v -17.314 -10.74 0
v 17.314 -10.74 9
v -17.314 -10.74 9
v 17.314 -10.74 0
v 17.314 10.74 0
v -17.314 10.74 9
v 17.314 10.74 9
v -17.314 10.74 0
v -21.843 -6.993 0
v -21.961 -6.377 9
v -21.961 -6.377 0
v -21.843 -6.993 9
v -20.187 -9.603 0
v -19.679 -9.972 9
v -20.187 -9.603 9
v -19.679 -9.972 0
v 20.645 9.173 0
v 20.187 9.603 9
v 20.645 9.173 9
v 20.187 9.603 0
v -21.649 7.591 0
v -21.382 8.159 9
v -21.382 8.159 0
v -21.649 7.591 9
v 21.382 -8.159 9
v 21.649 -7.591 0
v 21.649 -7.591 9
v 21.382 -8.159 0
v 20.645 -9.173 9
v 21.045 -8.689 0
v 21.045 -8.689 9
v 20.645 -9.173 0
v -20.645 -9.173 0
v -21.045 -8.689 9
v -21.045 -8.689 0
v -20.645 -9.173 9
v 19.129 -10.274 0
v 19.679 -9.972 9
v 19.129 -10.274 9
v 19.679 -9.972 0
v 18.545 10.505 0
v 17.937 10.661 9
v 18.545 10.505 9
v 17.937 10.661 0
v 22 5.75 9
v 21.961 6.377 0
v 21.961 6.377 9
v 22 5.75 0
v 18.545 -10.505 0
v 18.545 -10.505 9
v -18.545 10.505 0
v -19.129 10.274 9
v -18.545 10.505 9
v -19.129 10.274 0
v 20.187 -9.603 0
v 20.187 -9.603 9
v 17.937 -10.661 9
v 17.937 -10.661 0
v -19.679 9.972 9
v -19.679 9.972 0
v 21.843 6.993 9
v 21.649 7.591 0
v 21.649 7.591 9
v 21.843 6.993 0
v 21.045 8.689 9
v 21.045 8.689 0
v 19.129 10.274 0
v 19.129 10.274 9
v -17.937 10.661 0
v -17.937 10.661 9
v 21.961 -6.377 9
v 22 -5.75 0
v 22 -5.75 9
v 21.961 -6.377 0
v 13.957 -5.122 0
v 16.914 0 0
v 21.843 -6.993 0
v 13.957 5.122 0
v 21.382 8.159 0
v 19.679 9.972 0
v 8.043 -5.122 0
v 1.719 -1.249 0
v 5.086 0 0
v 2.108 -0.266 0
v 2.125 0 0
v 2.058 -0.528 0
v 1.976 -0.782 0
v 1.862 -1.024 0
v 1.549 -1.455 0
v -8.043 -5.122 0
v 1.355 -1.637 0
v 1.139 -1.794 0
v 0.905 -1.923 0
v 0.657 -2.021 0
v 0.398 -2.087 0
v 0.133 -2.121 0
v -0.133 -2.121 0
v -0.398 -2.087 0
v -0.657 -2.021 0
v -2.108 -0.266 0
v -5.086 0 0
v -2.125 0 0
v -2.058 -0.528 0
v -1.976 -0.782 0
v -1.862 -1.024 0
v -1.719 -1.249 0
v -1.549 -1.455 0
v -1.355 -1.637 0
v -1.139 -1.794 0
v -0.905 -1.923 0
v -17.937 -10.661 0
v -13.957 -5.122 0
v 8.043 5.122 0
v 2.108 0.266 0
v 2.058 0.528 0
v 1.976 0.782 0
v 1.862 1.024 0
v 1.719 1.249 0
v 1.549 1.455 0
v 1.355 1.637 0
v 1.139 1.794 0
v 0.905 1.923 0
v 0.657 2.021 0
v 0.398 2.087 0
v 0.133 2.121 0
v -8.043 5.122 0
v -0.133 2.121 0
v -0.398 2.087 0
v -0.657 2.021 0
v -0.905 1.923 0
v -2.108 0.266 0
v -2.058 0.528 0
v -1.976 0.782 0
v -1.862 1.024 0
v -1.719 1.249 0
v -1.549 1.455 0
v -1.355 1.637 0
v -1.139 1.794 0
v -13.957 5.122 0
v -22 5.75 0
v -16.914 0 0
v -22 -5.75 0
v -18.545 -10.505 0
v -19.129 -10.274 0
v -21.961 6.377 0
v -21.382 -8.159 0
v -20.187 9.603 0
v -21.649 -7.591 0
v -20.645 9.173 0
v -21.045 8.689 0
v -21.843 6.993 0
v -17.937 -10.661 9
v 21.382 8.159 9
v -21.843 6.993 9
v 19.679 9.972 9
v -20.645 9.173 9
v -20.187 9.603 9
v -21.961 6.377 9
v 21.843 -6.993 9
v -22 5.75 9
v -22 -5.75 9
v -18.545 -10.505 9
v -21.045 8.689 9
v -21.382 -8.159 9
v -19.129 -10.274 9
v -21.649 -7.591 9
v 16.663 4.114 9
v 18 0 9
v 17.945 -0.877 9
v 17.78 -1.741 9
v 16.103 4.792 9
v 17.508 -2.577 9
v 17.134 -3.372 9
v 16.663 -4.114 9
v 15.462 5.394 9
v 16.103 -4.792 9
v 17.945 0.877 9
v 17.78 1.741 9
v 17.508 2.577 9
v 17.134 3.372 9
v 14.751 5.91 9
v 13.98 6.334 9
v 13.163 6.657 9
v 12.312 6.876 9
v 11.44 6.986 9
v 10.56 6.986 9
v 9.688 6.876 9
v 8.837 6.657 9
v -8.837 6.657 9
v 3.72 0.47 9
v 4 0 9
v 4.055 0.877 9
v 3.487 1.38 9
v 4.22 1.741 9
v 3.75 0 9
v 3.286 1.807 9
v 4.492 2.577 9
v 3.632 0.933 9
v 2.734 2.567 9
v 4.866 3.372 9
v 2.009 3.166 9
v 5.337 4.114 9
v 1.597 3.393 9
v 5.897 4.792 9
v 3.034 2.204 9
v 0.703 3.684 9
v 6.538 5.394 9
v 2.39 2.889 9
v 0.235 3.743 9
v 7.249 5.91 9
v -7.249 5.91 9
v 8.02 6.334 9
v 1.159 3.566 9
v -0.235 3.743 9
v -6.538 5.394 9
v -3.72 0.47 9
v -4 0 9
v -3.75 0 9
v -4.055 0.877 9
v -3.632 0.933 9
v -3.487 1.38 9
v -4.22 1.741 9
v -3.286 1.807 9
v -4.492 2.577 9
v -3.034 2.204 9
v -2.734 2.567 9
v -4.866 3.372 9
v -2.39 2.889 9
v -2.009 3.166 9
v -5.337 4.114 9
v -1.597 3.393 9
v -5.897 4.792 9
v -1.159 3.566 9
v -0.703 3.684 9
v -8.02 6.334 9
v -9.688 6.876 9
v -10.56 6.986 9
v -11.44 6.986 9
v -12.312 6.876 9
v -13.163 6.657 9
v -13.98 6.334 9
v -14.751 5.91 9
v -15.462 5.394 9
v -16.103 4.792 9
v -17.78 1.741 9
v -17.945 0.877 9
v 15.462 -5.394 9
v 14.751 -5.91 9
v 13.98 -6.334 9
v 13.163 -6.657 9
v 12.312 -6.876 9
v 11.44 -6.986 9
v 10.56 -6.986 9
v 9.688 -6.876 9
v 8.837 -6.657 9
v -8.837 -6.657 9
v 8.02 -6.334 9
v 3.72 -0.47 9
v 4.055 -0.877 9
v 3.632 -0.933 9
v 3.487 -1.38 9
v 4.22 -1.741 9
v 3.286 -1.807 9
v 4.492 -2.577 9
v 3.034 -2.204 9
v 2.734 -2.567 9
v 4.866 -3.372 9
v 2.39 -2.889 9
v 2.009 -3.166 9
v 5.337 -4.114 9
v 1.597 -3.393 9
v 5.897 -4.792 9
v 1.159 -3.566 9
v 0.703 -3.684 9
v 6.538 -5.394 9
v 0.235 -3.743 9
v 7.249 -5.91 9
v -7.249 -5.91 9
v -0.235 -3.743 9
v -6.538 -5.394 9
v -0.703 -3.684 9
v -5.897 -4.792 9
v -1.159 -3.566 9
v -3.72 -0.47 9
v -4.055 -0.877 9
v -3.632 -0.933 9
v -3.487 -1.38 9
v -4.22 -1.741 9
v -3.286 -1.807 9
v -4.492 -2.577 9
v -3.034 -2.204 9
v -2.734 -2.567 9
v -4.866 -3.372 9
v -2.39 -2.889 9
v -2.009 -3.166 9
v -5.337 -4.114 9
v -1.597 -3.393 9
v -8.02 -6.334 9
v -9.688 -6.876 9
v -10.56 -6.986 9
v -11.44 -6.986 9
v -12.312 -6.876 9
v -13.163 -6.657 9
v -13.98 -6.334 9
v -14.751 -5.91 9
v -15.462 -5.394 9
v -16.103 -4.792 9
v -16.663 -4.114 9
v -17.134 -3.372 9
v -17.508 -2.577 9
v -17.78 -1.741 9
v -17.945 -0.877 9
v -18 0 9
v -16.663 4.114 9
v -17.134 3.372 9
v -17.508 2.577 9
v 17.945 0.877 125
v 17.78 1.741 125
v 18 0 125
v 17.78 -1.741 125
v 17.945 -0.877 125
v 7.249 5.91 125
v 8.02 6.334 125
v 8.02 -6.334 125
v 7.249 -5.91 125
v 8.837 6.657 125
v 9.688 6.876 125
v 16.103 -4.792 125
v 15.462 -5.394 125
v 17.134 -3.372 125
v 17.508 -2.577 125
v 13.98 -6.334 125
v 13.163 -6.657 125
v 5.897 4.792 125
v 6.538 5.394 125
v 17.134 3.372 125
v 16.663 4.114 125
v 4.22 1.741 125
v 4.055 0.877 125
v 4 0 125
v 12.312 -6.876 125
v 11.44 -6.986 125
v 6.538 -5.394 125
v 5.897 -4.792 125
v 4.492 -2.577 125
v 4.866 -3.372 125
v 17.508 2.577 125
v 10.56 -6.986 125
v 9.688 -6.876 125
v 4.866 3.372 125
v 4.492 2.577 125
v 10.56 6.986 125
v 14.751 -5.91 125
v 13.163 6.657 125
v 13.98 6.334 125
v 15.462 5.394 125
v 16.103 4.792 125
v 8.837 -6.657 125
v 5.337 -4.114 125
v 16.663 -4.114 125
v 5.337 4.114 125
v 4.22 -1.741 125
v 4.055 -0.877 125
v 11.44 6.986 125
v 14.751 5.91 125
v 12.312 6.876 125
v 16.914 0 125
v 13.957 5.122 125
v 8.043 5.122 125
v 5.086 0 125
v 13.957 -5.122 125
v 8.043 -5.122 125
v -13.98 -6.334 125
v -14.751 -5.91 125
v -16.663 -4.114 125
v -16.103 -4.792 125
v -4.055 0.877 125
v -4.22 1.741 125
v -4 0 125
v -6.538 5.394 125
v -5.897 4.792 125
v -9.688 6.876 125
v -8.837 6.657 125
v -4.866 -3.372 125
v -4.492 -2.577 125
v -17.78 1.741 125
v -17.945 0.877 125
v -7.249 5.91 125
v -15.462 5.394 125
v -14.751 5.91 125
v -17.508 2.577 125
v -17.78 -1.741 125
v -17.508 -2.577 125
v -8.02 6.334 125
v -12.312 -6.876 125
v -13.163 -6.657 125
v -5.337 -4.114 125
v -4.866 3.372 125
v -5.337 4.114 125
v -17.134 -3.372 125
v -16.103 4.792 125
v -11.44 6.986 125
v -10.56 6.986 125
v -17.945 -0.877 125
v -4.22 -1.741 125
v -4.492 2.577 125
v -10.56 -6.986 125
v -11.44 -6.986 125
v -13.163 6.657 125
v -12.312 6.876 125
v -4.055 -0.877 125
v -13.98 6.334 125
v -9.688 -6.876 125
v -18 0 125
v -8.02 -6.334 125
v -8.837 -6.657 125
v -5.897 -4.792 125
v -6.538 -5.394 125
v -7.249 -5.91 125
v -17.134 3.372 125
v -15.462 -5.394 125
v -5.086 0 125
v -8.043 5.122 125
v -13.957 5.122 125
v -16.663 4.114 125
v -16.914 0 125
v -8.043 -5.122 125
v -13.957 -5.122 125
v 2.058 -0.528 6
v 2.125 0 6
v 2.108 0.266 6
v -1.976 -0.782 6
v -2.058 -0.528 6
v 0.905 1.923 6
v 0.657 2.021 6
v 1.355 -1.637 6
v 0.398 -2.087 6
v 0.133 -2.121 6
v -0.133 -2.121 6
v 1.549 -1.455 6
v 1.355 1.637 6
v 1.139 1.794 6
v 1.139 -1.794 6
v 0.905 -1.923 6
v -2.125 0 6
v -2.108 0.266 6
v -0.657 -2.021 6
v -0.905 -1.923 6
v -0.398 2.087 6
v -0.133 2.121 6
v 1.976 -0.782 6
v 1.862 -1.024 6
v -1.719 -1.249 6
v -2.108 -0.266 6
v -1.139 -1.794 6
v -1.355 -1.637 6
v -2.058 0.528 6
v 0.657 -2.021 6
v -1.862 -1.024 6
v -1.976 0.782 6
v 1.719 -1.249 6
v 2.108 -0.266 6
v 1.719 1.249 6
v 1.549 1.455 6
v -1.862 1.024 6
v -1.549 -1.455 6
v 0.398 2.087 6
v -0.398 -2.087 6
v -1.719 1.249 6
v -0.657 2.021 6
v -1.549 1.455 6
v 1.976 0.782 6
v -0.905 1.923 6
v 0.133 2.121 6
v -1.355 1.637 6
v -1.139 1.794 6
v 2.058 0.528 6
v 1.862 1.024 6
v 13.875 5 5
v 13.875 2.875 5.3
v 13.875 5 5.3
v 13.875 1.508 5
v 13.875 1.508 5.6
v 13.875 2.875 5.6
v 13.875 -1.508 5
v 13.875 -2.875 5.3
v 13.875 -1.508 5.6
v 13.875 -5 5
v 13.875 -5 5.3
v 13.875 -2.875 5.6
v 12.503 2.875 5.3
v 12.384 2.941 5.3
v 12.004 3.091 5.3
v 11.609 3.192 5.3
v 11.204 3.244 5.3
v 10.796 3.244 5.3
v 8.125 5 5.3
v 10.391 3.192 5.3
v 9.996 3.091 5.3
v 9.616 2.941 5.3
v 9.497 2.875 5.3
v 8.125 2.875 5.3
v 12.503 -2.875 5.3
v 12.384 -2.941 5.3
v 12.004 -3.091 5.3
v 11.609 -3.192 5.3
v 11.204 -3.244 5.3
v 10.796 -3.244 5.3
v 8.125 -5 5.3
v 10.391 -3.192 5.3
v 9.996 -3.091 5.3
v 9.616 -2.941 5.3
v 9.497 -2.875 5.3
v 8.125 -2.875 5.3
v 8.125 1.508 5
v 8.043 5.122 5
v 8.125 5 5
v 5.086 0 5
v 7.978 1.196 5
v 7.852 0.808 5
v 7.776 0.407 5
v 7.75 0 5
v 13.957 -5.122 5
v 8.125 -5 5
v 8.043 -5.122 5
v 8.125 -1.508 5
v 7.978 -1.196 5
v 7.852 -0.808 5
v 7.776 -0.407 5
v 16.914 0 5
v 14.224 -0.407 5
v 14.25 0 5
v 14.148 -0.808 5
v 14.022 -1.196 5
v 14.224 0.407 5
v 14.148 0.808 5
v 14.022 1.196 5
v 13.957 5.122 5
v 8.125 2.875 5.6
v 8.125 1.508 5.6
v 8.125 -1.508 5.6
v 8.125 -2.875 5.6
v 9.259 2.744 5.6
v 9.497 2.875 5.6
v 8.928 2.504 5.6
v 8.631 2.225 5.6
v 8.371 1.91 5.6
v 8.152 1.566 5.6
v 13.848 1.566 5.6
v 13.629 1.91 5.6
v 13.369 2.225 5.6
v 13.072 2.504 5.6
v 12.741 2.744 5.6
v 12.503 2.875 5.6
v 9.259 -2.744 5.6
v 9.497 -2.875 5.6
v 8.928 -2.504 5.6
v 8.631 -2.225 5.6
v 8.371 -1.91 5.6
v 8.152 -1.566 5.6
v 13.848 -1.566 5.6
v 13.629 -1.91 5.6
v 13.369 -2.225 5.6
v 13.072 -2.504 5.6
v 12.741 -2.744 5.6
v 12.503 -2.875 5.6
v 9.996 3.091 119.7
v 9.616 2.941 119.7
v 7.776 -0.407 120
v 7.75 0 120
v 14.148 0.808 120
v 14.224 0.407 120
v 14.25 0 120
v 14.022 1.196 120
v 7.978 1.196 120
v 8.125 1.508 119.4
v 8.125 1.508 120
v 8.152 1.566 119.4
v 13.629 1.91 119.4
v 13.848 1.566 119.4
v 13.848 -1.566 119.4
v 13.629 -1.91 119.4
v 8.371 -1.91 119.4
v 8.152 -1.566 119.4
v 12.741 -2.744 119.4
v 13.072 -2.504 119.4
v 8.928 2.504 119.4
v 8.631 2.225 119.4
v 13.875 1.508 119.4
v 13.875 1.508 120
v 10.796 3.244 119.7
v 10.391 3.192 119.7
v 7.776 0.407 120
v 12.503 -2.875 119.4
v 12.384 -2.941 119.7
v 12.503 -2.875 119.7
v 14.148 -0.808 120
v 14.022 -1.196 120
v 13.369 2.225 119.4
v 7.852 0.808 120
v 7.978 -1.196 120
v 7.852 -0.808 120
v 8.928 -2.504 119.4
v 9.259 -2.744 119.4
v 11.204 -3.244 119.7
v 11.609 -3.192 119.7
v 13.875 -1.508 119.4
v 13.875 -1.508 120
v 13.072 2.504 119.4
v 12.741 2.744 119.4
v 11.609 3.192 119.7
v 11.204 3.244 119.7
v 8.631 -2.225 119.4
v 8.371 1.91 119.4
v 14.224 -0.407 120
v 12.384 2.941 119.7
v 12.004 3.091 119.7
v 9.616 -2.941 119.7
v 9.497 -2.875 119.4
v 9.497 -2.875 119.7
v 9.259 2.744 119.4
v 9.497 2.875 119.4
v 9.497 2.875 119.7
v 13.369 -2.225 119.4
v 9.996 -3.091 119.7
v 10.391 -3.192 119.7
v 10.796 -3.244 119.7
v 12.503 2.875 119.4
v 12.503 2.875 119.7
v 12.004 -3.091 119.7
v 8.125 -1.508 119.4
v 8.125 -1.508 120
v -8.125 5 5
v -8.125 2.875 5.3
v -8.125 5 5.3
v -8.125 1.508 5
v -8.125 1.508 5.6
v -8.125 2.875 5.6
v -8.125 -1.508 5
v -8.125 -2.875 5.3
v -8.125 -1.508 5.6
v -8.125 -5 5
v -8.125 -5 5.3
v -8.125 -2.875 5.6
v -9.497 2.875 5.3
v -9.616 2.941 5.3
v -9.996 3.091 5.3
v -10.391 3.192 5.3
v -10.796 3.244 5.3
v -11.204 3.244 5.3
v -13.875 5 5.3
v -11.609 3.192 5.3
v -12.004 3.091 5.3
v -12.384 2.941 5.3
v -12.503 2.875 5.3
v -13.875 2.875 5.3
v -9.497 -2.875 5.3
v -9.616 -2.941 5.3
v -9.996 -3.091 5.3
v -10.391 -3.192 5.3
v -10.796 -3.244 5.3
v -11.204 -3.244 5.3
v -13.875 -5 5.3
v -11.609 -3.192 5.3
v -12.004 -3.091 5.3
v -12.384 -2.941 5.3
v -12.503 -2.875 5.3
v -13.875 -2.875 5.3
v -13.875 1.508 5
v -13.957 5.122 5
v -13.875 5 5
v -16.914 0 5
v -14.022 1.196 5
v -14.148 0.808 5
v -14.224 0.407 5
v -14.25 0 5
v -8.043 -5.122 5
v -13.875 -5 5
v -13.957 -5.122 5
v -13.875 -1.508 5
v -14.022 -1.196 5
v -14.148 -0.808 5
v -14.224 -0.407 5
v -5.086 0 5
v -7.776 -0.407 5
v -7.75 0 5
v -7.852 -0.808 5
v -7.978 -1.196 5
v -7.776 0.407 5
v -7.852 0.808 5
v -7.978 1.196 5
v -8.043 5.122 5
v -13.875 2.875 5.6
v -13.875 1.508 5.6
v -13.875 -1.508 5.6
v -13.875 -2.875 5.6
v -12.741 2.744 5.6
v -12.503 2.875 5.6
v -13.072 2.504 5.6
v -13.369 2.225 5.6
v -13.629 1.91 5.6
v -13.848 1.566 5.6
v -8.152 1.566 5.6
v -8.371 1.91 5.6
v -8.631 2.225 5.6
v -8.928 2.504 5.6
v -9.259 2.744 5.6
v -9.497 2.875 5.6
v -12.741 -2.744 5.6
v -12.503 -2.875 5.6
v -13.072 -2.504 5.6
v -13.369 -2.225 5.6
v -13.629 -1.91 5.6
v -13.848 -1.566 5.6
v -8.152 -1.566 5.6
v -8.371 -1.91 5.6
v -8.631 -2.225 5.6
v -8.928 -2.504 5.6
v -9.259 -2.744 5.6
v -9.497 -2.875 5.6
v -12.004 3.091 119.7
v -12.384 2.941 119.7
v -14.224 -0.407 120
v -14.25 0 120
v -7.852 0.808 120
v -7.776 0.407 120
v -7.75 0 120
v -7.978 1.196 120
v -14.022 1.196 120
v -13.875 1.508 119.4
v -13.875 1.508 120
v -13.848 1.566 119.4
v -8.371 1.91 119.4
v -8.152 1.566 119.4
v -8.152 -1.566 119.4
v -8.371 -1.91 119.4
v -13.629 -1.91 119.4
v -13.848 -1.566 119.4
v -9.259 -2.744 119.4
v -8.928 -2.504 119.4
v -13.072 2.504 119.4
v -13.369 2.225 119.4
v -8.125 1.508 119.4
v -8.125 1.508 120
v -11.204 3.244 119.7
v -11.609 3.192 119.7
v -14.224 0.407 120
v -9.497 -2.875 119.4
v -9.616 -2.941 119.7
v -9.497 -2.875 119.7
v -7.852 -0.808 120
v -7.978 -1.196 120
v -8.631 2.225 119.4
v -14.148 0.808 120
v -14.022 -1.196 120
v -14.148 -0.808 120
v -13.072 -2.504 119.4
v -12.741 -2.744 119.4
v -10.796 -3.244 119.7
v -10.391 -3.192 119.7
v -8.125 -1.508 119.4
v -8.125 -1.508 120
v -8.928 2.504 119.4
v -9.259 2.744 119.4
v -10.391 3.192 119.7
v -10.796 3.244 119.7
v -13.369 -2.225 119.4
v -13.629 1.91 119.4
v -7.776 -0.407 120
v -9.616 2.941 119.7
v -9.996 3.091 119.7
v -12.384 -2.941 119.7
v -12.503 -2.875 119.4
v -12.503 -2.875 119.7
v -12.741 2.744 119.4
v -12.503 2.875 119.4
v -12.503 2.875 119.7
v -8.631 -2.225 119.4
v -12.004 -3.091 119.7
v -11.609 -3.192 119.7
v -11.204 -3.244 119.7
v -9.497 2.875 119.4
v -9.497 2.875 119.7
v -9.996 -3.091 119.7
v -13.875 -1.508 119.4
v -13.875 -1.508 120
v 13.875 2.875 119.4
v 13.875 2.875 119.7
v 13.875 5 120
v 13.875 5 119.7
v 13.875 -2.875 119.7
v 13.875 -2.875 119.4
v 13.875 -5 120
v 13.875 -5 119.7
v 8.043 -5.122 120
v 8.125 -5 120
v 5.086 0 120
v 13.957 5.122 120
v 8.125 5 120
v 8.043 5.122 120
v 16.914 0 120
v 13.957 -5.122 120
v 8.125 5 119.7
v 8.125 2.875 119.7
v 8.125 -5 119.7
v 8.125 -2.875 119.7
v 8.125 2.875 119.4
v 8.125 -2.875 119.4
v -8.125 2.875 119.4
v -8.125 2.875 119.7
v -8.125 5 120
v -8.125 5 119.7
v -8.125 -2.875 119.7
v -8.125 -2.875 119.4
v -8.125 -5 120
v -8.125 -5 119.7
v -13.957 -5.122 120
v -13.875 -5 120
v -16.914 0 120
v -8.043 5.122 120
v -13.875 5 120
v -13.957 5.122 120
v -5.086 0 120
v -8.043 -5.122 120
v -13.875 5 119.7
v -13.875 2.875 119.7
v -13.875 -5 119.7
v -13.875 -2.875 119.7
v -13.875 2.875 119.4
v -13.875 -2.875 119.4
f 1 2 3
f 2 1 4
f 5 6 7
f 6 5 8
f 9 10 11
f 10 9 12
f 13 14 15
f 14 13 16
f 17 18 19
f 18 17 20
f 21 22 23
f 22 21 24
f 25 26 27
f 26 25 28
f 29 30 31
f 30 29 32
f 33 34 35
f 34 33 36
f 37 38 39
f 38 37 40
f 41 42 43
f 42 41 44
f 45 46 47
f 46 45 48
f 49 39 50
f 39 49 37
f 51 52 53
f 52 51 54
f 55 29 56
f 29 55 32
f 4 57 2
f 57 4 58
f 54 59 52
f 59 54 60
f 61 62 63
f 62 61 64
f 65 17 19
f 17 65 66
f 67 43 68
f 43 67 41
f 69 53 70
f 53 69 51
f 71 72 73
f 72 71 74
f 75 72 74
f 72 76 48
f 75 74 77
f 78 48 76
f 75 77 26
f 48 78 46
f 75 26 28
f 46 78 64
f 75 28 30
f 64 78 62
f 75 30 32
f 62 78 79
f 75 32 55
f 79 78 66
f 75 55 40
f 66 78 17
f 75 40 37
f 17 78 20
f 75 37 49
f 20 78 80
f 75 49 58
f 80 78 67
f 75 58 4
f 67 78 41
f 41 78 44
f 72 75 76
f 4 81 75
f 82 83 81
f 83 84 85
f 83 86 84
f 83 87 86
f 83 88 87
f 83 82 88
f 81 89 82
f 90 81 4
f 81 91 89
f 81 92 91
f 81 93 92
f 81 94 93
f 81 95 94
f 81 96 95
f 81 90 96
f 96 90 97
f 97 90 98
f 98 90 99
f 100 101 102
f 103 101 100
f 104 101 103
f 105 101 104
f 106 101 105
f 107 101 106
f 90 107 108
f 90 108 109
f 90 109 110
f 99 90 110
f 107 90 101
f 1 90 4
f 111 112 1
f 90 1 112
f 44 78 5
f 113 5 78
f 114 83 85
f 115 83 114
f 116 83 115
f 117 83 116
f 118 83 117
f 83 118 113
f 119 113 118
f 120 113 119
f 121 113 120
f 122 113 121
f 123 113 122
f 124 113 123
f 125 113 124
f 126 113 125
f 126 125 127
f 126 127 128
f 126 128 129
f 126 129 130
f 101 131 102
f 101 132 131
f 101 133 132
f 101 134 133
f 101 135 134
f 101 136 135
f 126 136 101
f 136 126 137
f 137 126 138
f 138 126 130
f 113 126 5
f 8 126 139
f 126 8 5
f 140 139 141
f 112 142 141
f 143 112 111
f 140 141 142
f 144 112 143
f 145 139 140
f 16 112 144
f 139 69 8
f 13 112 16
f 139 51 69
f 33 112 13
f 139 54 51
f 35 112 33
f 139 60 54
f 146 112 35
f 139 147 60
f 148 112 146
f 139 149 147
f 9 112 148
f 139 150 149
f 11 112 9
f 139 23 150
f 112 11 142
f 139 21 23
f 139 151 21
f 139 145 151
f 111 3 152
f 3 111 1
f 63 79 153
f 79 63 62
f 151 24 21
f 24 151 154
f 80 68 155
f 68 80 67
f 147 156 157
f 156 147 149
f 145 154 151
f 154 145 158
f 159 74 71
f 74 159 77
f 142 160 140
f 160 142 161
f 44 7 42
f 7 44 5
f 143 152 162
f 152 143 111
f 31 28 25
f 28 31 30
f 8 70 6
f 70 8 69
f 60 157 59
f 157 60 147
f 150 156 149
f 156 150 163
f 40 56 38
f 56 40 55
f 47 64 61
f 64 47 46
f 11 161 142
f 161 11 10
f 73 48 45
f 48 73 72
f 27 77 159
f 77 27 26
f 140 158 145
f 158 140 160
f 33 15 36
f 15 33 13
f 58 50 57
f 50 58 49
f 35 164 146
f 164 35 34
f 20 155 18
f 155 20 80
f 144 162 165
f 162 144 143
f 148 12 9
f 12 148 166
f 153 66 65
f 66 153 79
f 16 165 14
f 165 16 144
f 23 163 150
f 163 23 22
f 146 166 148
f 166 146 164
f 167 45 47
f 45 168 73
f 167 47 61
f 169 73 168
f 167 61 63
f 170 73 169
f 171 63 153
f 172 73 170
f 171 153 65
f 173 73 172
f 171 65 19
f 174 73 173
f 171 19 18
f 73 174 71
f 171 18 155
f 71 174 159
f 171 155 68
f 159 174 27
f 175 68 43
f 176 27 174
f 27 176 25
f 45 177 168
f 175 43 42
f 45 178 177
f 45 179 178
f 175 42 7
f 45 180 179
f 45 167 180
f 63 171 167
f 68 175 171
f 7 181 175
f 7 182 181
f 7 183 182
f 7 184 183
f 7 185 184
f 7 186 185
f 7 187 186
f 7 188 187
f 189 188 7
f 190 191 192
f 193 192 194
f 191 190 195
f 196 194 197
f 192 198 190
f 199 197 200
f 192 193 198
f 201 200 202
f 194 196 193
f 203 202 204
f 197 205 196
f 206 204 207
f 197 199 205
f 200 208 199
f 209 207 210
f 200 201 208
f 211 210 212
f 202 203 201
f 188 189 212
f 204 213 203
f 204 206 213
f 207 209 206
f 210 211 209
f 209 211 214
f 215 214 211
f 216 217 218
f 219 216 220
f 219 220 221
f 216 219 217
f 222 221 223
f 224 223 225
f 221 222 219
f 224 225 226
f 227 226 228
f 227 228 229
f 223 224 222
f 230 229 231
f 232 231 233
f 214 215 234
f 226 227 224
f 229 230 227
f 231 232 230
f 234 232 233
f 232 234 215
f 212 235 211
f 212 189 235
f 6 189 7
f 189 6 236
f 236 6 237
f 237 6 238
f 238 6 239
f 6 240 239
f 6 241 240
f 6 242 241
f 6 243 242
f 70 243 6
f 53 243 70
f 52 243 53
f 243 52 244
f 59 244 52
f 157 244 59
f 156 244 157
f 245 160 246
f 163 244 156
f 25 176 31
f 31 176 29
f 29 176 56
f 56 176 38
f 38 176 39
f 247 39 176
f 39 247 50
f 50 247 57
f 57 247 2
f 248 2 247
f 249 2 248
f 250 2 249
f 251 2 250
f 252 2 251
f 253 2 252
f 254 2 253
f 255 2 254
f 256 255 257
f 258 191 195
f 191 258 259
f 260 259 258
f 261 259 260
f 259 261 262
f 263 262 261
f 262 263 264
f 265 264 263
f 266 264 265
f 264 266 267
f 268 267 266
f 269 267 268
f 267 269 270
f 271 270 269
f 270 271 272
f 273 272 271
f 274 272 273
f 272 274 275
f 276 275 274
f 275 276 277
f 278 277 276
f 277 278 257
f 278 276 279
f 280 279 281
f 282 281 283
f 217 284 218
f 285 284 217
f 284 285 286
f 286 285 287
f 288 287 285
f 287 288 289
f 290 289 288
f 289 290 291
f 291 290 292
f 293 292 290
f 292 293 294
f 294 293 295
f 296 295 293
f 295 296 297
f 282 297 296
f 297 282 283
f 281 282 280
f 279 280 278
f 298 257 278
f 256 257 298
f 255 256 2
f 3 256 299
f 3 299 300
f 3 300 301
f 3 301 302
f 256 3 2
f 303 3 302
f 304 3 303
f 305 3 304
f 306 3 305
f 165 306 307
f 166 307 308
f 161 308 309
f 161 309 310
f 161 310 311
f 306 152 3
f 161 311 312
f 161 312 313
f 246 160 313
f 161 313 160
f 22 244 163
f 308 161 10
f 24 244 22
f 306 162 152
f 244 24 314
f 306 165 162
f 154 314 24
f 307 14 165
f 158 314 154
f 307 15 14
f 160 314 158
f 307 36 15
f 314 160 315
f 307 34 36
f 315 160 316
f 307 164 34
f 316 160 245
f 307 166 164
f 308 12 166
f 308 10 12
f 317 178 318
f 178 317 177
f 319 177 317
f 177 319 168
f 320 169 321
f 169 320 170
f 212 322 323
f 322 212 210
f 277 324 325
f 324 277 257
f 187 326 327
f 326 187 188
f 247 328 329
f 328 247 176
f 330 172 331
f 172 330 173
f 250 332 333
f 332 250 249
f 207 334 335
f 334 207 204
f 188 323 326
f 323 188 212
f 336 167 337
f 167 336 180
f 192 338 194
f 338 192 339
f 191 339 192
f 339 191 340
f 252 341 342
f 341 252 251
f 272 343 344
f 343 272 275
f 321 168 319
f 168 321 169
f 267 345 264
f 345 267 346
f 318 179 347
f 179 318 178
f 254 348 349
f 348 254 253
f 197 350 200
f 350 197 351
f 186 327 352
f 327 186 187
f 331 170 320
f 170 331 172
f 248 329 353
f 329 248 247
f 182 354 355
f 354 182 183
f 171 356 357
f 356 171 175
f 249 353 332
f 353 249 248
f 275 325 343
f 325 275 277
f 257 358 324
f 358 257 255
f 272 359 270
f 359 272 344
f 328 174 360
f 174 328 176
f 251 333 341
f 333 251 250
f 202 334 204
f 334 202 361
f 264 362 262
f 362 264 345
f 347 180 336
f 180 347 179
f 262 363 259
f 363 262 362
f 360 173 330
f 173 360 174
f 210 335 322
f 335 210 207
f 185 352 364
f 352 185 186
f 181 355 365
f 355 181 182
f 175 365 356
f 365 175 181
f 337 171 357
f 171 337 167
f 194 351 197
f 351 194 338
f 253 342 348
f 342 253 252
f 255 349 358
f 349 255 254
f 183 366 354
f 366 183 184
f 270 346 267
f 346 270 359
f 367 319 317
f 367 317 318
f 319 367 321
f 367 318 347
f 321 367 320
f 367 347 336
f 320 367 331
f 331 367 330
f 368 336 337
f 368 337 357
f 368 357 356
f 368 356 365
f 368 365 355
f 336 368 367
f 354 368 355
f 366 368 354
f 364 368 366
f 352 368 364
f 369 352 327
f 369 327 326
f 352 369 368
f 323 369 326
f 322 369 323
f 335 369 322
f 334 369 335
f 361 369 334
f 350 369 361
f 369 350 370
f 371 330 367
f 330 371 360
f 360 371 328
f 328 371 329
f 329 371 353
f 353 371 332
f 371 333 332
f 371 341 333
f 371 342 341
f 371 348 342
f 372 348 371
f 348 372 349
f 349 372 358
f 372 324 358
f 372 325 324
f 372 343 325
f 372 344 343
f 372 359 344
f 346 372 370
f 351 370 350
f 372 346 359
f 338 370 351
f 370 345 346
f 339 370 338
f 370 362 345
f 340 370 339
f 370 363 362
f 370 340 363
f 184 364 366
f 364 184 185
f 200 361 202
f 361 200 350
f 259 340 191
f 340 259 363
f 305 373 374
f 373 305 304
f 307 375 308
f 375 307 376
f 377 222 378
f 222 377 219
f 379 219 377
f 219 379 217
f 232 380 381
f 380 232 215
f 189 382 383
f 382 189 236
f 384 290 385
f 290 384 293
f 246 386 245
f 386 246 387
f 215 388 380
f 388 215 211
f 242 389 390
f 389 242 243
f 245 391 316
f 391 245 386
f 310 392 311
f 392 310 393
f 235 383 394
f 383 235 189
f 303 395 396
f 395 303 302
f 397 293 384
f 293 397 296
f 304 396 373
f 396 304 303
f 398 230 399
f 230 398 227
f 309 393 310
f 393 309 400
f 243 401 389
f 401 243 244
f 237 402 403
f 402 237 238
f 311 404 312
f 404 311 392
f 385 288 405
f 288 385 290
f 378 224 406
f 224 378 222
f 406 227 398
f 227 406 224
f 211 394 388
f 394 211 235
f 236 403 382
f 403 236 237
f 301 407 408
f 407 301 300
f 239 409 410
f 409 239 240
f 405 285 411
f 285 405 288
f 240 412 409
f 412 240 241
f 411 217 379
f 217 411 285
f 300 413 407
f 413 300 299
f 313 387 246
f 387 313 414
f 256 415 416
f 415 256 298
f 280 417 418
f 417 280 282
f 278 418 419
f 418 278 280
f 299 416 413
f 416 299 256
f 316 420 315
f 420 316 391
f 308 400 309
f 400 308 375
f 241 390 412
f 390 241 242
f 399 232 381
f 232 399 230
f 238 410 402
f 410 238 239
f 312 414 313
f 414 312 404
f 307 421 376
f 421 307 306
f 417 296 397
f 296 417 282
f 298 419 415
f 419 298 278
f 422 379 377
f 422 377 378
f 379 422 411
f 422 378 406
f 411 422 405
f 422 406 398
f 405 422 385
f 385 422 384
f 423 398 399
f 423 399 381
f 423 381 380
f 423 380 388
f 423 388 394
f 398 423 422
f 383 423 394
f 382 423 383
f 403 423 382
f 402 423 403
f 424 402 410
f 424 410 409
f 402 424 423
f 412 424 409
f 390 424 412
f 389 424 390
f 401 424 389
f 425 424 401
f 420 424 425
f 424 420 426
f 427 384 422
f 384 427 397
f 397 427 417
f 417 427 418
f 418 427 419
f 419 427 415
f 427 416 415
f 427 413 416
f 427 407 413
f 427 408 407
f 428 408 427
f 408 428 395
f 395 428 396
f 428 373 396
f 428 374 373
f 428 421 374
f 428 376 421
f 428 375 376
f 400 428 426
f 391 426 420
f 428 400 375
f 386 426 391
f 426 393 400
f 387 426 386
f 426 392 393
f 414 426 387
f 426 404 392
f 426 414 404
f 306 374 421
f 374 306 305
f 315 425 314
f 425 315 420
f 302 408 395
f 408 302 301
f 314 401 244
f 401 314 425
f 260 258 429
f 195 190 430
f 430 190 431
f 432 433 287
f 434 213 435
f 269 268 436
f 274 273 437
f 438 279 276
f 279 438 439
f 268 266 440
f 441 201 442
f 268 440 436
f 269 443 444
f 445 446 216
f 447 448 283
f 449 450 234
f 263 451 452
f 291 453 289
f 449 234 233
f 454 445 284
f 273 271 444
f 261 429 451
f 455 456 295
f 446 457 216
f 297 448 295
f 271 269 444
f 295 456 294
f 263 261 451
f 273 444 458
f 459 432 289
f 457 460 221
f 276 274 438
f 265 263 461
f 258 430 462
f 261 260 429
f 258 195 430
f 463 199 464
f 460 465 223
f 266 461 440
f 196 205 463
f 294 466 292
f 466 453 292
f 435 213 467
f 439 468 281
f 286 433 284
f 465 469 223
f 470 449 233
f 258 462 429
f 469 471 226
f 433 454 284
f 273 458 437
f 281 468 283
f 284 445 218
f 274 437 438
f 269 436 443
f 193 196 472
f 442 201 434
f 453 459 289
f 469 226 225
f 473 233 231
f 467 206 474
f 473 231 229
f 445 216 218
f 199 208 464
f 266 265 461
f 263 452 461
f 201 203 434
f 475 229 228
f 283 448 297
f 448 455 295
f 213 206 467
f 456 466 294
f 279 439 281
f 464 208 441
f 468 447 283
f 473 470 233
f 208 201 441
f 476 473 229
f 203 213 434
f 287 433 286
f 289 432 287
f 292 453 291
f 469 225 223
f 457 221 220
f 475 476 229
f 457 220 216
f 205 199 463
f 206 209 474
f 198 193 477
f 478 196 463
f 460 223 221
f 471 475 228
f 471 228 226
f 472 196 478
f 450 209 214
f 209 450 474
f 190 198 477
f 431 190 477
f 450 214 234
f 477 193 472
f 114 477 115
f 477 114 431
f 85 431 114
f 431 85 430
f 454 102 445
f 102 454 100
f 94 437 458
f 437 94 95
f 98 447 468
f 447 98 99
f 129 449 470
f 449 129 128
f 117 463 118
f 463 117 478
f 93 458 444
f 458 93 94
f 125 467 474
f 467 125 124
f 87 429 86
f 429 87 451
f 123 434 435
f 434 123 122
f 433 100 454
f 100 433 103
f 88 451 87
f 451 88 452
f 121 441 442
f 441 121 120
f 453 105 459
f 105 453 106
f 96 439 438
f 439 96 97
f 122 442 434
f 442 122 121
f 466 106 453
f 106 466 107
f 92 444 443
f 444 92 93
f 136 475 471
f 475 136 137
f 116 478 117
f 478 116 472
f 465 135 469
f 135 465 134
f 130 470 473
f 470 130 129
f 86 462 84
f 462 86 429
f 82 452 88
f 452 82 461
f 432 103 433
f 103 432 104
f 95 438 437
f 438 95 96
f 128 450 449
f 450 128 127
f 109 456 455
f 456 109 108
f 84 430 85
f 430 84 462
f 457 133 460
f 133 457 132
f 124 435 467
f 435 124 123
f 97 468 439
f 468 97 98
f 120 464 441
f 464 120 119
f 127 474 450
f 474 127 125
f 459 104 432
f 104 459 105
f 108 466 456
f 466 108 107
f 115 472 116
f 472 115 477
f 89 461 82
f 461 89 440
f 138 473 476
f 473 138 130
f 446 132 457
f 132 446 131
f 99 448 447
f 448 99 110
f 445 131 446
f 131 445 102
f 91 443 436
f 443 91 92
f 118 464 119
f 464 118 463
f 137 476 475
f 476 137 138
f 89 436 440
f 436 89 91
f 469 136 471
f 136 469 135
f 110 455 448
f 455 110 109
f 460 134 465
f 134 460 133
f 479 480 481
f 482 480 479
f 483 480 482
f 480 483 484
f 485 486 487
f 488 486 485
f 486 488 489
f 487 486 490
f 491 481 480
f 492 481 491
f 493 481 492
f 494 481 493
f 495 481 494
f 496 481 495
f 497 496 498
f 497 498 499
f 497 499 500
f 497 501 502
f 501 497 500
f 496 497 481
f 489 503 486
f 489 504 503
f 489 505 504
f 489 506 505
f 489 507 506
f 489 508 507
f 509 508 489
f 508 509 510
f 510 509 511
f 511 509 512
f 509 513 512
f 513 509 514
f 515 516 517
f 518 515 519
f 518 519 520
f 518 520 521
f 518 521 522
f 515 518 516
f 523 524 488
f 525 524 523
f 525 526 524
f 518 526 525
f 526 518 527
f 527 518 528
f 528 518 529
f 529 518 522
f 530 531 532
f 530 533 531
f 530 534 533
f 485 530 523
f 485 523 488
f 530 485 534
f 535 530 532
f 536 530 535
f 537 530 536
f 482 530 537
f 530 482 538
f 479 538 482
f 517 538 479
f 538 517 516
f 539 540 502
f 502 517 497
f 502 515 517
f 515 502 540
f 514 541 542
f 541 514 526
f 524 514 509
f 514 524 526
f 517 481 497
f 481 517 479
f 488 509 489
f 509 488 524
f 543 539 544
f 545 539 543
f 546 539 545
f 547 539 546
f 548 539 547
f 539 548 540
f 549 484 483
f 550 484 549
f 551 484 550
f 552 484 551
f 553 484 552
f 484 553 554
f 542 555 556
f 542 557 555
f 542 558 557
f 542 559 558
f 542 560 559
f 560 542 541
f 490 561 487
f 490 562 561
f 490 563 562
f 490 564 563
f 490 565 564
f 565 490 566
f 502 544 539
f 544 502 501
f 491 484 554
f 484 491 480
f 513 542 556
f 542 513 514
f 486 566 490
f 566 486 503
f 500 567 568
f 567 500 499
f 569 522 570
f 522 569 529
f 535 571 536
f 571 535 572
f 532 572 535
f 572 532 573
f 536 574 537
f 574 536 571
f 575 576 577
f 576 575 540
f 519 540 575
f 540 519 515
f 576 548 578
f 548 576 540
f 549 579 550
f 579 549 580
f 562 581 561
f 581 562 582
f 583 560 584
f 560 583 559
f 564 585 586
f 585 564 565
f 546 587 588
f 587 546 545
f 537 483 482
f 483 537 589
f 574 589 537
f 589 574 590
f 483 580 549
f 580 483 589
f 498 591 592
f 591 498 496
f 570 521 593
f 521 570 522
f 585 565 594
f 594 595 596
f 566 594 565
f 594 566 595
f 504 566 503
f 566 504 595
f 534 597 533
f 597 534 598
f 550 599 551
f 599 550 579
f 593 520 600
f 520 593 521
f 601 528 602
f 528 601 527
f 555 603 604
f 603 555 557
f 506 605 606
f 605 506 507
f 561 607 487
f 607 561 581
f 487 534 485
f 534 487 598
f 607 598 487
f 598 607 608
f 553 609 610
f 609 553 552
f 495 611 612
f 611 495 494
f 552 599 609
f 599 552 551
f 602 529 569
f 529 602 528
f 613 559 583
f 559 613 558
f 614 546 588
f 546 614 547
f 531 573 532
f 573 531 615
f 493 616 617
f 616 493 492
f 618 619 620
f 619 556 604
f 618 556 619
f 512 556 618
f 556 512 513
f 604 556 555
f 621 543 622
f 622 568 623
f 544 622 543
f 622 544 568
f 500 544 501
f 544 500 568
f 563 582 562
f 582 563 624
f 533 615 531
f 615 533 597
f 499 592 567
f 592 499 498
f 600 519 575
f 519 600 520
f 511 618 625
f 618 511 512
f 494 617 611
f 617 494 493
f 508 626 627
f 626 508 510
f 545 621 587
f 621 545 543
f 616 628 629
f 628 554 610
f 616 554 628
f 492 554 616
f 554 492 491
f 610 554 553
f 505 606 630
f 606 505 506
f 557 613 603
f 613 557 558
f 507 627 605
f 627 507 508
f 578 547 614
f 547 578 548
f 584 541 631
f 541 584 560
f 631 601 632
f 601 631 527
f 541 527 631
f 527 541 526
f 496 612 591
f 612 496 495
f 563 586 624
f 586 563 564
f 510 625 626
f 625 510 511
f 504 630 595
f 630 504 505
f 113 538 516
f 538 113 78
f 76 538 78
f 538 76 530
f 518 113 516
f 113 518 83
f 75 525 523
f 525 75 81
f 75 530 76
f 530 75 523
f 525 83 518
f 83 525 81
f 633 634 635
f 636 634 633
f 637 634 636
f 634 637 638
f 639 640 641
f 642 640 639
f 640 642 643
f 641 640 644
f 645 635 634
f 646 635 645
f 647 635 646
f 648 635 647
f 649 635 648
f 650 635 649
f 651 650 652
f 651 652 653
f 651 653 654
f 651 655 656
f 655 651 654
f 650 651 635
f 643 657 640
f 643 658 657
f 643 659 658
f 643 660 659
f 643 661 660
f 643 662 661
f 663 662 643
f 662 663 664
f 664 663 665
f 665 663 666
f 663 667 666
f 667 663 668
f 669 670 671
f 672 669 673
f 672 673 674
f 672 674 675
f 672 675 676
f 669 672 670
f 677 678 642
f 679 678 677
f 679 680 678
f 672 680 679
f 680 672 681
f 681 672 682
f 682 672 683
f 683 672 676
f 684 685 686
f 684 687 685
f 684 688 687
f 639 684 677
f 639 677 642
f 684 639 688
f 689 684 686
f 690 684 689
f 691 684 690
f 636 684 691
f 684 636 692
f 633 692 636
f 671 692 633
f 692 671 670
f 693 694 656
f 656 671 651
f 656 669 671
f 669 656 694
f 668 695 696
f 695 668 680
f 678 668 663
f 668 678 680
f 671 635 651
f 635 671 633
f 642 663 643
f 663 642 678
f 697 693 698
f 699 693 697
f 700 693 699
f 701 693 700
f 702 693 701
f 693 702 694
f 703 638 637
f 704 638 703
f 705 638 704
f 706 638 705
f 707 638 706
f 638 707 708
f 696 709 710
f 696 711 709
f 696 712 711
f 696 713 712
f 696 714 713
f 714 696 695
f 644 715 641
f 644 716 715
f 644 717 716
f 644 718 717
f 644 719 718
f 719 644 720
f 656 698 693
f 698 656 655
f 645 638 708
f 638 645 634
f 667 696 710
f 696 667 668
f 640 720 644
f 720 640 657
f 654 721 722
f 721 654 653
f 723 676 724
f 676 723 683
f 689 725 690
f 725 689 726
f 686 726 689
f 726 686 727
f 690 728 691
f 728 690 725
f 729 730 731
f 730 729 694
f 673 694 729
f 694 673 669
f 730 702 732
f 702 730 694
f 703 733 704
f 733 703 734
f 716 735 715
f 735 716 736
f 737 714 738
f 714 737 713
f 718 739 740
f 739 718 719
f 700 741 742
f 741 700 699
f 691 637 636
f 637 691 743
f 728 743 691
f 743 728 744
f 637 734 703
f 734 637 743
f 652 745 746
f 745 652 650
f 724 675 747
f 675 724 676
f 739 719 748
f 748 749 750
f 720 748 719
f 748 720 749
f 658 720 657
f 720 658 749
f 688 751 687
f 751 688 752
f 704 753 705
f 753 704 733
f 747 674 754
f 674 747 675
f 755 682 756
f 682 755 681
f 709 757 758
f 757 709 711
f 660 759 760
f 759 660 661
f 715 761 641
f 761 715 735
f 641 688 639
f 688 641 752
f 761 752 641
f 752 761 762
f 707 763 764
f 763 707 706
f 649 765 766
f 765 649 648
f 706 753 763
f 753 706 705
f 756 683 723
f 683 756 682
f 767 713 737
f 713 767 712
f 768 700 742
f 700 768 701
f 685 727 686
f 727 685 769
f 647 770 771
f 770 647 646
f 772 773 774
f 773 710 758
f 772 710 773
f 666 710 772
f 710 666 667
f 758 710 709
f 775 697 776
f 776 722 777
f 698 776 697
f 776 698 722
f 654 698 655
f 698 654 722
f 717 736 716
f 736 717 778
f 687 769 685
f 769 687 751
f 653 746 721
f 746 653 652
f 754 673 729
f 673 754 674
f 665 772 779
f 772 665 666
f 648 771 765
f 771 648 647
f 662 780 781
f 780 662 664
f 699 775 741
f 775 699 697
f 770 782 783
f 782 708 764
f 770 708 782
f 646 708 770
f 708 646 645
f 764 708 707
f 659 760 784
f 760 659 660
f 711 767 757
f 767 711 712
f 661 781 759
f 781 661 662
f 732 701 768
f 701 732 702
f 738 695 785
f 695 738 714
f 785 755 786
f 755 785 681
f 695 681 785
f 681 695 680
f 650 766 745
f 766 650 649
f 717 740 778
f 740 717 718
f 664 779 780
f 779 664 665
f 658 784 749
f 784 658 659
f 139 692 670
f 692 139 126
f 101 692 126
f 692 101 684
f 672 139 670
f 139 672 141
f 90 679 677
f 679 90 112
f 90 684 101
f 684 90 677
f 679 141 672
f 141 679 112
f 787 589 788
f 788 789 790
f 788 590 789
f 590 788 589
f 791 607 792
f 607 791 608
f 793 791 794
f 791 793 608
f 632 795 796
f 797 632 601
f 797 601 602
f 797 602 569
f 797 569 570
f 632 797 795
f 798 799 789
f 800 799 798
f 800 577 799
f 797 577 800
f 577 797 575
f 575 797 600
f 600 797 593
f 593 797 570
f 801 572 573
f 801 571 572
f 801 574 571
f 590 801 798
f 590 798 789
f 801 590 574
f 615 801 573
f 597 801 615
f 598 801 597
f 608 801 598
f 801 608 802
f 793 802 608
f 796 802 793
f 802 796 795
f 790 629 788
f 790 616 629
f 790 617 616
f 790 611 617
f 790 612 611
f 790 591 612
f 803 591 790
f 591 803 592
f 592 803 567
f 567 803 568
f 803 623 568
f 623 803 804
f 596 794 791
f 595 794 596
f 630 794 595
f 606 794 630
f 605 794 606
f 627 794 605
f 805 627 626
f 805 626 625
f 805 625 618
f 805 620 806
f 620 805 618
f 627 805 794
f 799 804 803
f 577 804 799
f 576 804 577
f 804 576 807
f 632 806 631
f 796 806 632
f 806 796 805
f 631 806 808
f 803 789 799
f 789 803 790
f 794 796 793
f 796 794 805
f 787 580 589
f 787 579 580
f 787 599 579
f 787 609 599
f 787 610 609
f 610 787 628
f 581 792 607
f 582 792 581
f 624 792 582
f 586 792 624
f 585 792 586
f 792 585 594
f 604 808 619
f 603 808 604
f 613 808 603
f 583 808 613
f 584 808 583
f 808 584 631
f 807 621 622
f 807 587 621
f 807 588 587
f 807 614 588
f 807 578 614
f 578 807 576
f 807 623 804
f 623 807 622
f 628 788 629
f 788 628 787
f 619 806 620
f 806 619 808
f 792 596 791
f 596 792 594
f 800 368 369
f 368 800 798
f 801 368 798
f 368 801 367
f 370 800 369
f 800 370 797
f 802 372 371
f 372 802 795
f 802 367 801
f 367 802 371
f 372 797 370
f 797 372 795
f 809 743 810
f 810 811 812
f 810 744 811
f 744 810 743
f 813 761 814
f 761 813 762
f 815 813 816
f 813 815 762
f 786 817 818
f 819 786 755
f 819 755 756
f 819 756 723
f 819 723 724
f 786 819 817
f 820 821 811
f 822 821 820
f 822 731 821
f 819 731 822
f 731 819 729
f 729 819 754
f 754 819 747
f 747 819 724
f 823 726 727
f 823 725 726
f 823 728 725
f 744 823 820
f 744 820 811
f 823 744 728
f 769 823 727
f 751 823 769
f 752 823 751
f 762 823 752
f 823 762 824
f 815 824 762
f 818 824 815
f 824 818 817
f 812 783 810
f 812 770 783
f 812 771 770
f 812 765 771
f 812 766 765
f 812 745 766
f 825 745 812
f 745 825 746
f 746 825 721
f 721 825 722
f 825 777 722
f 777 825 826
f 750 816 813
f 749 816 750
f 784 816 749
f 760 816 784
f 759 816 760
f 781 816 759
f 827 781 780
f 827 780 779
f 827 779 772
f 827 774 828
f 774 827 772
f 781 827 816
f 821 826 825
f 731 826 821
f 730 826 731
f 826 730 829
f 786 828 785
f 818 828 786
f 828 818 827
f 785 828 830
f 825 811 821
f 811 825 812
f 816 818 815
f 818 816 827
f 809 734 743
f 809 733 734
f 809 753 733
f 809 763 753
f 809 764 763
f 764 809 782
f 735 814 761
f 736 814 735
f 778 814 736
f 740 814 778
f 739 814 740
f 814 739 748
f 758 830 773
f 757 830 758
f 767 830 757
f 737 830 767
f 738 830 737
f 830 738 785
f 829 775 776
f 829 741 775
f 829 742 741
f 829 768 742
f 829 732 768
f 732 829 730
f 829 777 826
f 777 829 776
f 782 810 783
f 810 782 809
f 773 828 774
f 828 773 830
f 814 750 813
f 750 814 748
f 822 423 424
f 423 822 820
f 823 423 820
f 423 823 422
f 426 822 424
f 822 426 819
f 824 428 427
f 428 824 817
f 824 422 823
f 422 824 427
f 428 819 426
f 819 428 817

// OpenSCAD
$fn = 50;


difference() {
	union() {
		hull() {
			translate(v = [-17.0000000000, 5.7500000000, 0]) {
				cylinder(h = 9, r = 5);
			}
			translate(v = [17.0000000000, 5.7500000000, 0]) {
				cylinder(h = 9, r = 5);
			}
			translate(v = [-17.0000000000, -5.7500000000, 0]) {
				cylinder(h = 9, r = 5);
			}
			translate(v = [17.0000000000, -5.7500000000, 0]) {
				cylinder(h = 9, r = 5);
			}
		}
		translate(v = [11.0000000000, 0, 0.0000000000]) {
			cylinder(h = 125, r = 7.0000000000);
		}
		translate(v = [-11.0000000000, 0, 0.0000000000]) {
			cylinder(h = 125, r = 7.0000000000);
		}
	}
	union() {
		translate(v = [0, 0, 9]) {
			rotate(a = [0, 0, 0]) {
				difference() {
					union() {
						#translate(v = [0, 0, -120.0000000000]) {
							cylinder(h = 120, r = 2.0000000000);
						}
						#translate(v = [0, 0, -3]) {
							cylinder(h = 3, r1 = 2.1250000000, r2 = 3.7500000000);
						}
						#translate(v = [0, 0, -120.0000000000]) {
							cylinder(h = 120, r = 2.1250000000);
						}
						#translate(v = [0, 0, -120.0000000000]) {
							cylinder(h = 120, r = 2.0000000000);
						}
					}
					union();
				}
			}
		}
		translate(v = [11.0000000000, 0, 0]) {
			rotate(a = [0, 0, 0]) {
				difference() {
					union() {
						#translate(v = [-2.8750000000, -5.0000000000, -0.3000000000]) {
							cube(size = [5.7500000000, 10, 0.3000000000]);
						}
						#translate(v = [-2.8750000000, -2.8750000000, -0.6000000000]) {
							cube(size = [5.7500000000, 5.7500000000, 0.3000000000]);
						}
						#translate(v = [-2.8750000000, -5.0000000000, 5]) {
							cube(size = [5.7500000000, 10, 0.3000000000]);
						}
						#translate(v = [-2.8750000000, -2.8750000000, 5.3000000000]) {
							cube(size = [5.7500000000, 5.7500000000, 0.3000000000]);
						}
						#translate(v = [0, 0, -100.0000000000]) {
							cylinder(h = 200, r = 3.2500000000);
						}
						#linear_extrude(height = 5) {
							polygon(points = [[5.9142500000, 0.0000000000], [2.9571250000, 5.1218907443], [-2.9571250000, 5.1218907443], [-5.9142500000, 0.0000000000], [-2.9571250000, -5.1218907443], [2.9571250000, -5.1218907443]]);
						}
						#translate(v = [-2.8750000000, -5.0000000000, -0.3000000000]) {
							cube(size = [5.7500000000, 10, 0.3000000000]);
						}
						#translate(v = [-2.8750000000, -2.8750000000, -0.6000000000]) {
							cube(size = [5.7500000000, 5.7500000000, 0.3000000000]);
						}
						#translate(v = [-2.8750000000, -5.0000000000, 5]) {
							cube(size = [5.7500000000, 10, 0.3000000000]);
						}
						#translate(v = [-2.8750000000, -2.8750000000, 5.3000000000]) {
							cube(size = [5.7500000000, 5.7500000000, 0.3000000000]);
						}
						#translate(v = [0, 0, -100.0000000000]) {
							cylinder(h = 200, r = 3.2500000000);
						}
						#translate(v = [-2.8750000000, -5.0000000000, -0.3000000000]) {
							cube(size = [5.7500000000, 10, 0.3000000000]);
						}
						#translate(v = [-2.8750000000, -2.8750000000, -0.6000000000]) {
							cube(size = [5.7500000000, 5.7500000000, 0.3000000000]);
						}
						#translate(v = [-2.8750000000, -5.0000000000, 5]) {
							cube(size = [5.7500000000, 10, 0.3000000000]);
						}
						#translate(v = [-2.8750000000, -2.8750000000, 5.3000000000]) {
							cube(size = [5.7500000000, 5.7500000000, 0.3000000000]);
						}
						#translate(v = [0, 0, -100.0000000000]) {
							cylinder(h = 200, r = 3.2500000000);
						}
					}
					union();
				}
			}
		}
		translate(v = [-11.0000000000, 0, 0]) {
			rotate(a = [0, 0, 0]) {
				difference() {
					union() {
						#translate(v = [-2.8750000000, -5.0000000000, -0.3000000000]) {
							cube(size = [5.7500000000, 10, 0.3000000000]);
						}
						#translate(v = [-2.8750000000, -2.8750000000, -0.6000000000]) {
							cube(size = [5.7500000000, 5.7500000000, 0.3000000000]);
						}
						#translate(v = [-2.8750000000, -5.0000000000, 5]) {
							cube(size = [5.7500000000, 10, 0.3000000000]);
						}
						#translate(v = [-2.8750000000, -2.8750000000, 5.3000000000]) {
							cube(size = [5.7500000000, 5.7500000000, 0.3000000000]);
						}
						#translate(v = [0, 0, -100.0000000000]) {
							cylinder(h = 200, r = 3.2500000000);
						}
						#linear_extrude(height = 5) {
							polygon(points = [[5.9142500000, 0.0000000000], [2.9571250000, 5.1218907443], [-2.9571250000, 5.1218907443], [-5.9142500000, 0.0000000000], [-2.9571250000, -5.1218907443], [2.9571250000, -5.1218907443]]);
						}
						#translate(v = [-2.8750000000, -5.0000000000, -0.3000000000]) {
							cube(size = [5.7500000000, 10, 0.3000000000]);
						}
						#translate(v = [-2.8750000000, -2.8750000000, -0.6000000000]) {
							cube(size = [5.7500000000, 5.7500000000, 0.3000000000]);
						}
						#translate(v = [-2.8750000000, -5.0000000000, 5]) {
							cube(size = [5.7500000000, 10, 0.3000000000]);
						}
						#translate(v = [-2.8750000000, -2.8750000000, 5.3000000000]) {
							cube(size = [5.7500000000, 5.7500000000, 0.3000000000]);
						}
						#translate(v = [0, 0, -100.0000000000]) {
							cylinder(h = 200, r = 3.2500000000);
						}
						#translate(v = [-2.8750000000, -5.0000000000, -0.3000000000]) {
							cube(size = [5.7500000000, 10, 0.3000000000]);
						}
						#translate(v = [-2.8750000000, -2.8750000000, -0.6000000000]) {
							cube(size = [5.7500000000, 5.7500000000, 0.3000000000]);
						}
						#translate(v = [-2.8750000000, -5.0000000000, 5]) {
							cube(size = [5.7500000000, 10, 0.3000000000]);
						}
						#translate(v = [-2.8750000000, -2.8750000000, 5.3000000000]) {
							cube(size = [5.7500000000, 5.7500000000, 0.3000000000]);
						}
						#translate(v = [0, 0, -100.0000000000]) {
							cylinder(h = 200, r = 3.2500000000);
						}
					}
					union();
				}
			}
		}
		translate(v = [11.0000000000, 0, 125]) {
			rotate(a = [0, 0, 0]) {
				difference() {
					union() {
						#translate(v = [-2.8750000000, -5.0000000000, -5.3000000000]) {
							cube(size = [5.7500000000, 10, 0.3000000000]);
						}
						#translate(v = [-2.8750000000, -2.8750000000, -5.6000000000]) {
							cube(size = [5.7500000000, 5.7500000000, 0.3000000000]);
						}
						#translate(v = [-2.8750000000, -5.0000000000, 0]) {
							cube(size = [5.7500000000, 10, 0.3000000000]);
						}
						#translate(v = [-2.8750000000, -2.8750000000, 0.3000000000]) {
							cube(size = [5.7500000000, 5.7500000000, 0.3000000000]);
						}
						#translate(v = [0, 0, -100.0000000000]) {
							cylinder(h = 200, r = 3.2500000000);
						}
						translate(v = [0, 0, -5]) {
							#linear_extrude(height = 5) {
								polygon(points = [[5.9142500000, 0.0000000000], [2.9571250000, 5.1218907443], [-2.9571250000, 5.1218907443], [-5.9142500000, 0.0000000000], [-2.9571250000, -5.1218907443], [2.9571250000, -5.1218907443]]);
							}
						}
						#translate(v = [-2.8750000000, -5.0000000000, -5.3000000000]) {
							cube(size = [5.7500000000, 10, 0.3000000000]);
						}
						#translate(v = [-2.8750000000, -2.8750000000, -5.6000000000]) {
							cube(size = [5.7500000000, 5.7500000000, 0.3000000000]);
						}
						#translate(v = [-2.8750000000, -5.0000000000, 0]) {
							cube(size = [5.7500000000, 10, 0.3000000000]);
						}
						#translate(v = [-2.8750000000, -2.8750000000, 0.3000000000]) {
							cube(size = [5.7500000000, 5.7500000000, 0.3000000000]);
						}
						#translate(v = [0, 0, -100.0000000000]) {
							cylinder(h = 200, r = 3.2500000000);
						}
						#translate(v = [-2.8750000000, -5.0000000000, -5.3000000000]) {
							cube(size = [5.7500000000, 10, 0.3000000000]);
						}
						#translate(v = [-2.8750000000, -2.8750000000, -5.6000000000]) {
							cube(size = [5.7500000000, 5.7500000000, 0.3000000000]);
						}
						#translate(v = [-2.8750000000, -5.0000000000, 0]) {
							cube(size = [5.7500000000, 10, 0.3000000000]);
						}
						#translate(v = [-2.8750000000, -2.8750000000, 0.3000000000]) {
							cube(size = [5.7500000000, 5.7500000000, 0.3000000000]);
						}
						#translate(v = [0, 0, -100.0000000000]) {
							cylinder(h = 200, r = 3.2500000000);
						}
					}
					union();
				}
			}
		}
		translate(v = [-11.0000000000, 0, 125]) {
			rotate(a = [0, 0, 0]) {
				difference() {
					union() {
						#translate(v = [-2.8750000000, -5.0000000000, -5.3000000000]) {
							cube(size = [5.7500000000, 10, 0.3000000000]);
						}
						#translate(v = [-2.8750000000, -2.8750000000, -5.6000000000]) {
							cube(size = [5.7500000000, 5.7500000000, 0.3000000000]);
						}
						#translate(v = [-2.8750000000, -5.0000000000, 0]) {
							cube(size = [5.7500000000, 10, 0.3000000000]);
						}
						#translate(v = [-2.8750000000, -2.8750000000, 0.3000000000]) {
							cube(size = [5.7500000000, 5.7500000000, 0.3000000000]);
						}
						#translate(v = [0, 0, -100.0000000000]) {
							cylinder(h = 200, r = 3.2500000000);
						}
						translate(v = [0, 0, -5]) {
							#linear_extrude(height = 5) {
								polygon(points = [[5.9142500000, 0.0000000000], [2.9571250000, 5.1218907443], [-2.9571250000, 5.1218907443], [-5.9142500000, 0.0000000000], [-2.9571250000, -5.1218907443], [2.9571250000, -5.1218907443]]);
							}
						}
						#translate(v = [-2.8750000000, -5.0000000000, -5.3000000000]) {
							cube(size = [5.7500000000, 10, 0.3000000000]);
						}
						#translate(v = [-2.8750000000, -2.8750000000, -5.6000000000]) {
							cube(size = [5.7500000000, 5.7500000000, 0.3000000000]);
						}
						#translate(v = [-2.8750000000, -5.0000000000, 0]) {
							cube(size = [5.7500000000, 10, 0.3000000000]);
						}
						#translate(v = [-2.8750000000, -2.8750000000, 0.3000000000]) {
							cube(size = [5.7500000000, 5.7500000000, 0.3000000000]);
						}
						#translate(v = [0, 0, -100.0000000000]) {
							cylinder(h = 200, r = 3.2500000000);
						}
						#translate(v = [-2.8750000000, -5.0000000000, -5.3000000000]) {
							cube(size = [5.7500000000, 10, 0.3000000000]);
						}
						#translate(v = [-2.8750000000, -2.8750000000, -5.6000000000]) {
							cube(size = [5.7500000000, 5.7500000000, 0.3000000000]);
						}
						#translate(v = [-2.8750000000, -5.0000000000, 0]) {
							cube(size = [5.7500000000, 10, 0.3000000000]);
						}
						#translate(v = [-2.8750000000, -2.8750000000, 0.3000000000]) {
							cube(size = [5.7500000000, 5.7500000000, 0.3000000000]);
						}
						#translate(v = [0, 0, -100.0000000000]) {
							cylinder(h = 200, r = 3.2500000000);
						}
					}
					union();
				}
			}
		}
	}
}
